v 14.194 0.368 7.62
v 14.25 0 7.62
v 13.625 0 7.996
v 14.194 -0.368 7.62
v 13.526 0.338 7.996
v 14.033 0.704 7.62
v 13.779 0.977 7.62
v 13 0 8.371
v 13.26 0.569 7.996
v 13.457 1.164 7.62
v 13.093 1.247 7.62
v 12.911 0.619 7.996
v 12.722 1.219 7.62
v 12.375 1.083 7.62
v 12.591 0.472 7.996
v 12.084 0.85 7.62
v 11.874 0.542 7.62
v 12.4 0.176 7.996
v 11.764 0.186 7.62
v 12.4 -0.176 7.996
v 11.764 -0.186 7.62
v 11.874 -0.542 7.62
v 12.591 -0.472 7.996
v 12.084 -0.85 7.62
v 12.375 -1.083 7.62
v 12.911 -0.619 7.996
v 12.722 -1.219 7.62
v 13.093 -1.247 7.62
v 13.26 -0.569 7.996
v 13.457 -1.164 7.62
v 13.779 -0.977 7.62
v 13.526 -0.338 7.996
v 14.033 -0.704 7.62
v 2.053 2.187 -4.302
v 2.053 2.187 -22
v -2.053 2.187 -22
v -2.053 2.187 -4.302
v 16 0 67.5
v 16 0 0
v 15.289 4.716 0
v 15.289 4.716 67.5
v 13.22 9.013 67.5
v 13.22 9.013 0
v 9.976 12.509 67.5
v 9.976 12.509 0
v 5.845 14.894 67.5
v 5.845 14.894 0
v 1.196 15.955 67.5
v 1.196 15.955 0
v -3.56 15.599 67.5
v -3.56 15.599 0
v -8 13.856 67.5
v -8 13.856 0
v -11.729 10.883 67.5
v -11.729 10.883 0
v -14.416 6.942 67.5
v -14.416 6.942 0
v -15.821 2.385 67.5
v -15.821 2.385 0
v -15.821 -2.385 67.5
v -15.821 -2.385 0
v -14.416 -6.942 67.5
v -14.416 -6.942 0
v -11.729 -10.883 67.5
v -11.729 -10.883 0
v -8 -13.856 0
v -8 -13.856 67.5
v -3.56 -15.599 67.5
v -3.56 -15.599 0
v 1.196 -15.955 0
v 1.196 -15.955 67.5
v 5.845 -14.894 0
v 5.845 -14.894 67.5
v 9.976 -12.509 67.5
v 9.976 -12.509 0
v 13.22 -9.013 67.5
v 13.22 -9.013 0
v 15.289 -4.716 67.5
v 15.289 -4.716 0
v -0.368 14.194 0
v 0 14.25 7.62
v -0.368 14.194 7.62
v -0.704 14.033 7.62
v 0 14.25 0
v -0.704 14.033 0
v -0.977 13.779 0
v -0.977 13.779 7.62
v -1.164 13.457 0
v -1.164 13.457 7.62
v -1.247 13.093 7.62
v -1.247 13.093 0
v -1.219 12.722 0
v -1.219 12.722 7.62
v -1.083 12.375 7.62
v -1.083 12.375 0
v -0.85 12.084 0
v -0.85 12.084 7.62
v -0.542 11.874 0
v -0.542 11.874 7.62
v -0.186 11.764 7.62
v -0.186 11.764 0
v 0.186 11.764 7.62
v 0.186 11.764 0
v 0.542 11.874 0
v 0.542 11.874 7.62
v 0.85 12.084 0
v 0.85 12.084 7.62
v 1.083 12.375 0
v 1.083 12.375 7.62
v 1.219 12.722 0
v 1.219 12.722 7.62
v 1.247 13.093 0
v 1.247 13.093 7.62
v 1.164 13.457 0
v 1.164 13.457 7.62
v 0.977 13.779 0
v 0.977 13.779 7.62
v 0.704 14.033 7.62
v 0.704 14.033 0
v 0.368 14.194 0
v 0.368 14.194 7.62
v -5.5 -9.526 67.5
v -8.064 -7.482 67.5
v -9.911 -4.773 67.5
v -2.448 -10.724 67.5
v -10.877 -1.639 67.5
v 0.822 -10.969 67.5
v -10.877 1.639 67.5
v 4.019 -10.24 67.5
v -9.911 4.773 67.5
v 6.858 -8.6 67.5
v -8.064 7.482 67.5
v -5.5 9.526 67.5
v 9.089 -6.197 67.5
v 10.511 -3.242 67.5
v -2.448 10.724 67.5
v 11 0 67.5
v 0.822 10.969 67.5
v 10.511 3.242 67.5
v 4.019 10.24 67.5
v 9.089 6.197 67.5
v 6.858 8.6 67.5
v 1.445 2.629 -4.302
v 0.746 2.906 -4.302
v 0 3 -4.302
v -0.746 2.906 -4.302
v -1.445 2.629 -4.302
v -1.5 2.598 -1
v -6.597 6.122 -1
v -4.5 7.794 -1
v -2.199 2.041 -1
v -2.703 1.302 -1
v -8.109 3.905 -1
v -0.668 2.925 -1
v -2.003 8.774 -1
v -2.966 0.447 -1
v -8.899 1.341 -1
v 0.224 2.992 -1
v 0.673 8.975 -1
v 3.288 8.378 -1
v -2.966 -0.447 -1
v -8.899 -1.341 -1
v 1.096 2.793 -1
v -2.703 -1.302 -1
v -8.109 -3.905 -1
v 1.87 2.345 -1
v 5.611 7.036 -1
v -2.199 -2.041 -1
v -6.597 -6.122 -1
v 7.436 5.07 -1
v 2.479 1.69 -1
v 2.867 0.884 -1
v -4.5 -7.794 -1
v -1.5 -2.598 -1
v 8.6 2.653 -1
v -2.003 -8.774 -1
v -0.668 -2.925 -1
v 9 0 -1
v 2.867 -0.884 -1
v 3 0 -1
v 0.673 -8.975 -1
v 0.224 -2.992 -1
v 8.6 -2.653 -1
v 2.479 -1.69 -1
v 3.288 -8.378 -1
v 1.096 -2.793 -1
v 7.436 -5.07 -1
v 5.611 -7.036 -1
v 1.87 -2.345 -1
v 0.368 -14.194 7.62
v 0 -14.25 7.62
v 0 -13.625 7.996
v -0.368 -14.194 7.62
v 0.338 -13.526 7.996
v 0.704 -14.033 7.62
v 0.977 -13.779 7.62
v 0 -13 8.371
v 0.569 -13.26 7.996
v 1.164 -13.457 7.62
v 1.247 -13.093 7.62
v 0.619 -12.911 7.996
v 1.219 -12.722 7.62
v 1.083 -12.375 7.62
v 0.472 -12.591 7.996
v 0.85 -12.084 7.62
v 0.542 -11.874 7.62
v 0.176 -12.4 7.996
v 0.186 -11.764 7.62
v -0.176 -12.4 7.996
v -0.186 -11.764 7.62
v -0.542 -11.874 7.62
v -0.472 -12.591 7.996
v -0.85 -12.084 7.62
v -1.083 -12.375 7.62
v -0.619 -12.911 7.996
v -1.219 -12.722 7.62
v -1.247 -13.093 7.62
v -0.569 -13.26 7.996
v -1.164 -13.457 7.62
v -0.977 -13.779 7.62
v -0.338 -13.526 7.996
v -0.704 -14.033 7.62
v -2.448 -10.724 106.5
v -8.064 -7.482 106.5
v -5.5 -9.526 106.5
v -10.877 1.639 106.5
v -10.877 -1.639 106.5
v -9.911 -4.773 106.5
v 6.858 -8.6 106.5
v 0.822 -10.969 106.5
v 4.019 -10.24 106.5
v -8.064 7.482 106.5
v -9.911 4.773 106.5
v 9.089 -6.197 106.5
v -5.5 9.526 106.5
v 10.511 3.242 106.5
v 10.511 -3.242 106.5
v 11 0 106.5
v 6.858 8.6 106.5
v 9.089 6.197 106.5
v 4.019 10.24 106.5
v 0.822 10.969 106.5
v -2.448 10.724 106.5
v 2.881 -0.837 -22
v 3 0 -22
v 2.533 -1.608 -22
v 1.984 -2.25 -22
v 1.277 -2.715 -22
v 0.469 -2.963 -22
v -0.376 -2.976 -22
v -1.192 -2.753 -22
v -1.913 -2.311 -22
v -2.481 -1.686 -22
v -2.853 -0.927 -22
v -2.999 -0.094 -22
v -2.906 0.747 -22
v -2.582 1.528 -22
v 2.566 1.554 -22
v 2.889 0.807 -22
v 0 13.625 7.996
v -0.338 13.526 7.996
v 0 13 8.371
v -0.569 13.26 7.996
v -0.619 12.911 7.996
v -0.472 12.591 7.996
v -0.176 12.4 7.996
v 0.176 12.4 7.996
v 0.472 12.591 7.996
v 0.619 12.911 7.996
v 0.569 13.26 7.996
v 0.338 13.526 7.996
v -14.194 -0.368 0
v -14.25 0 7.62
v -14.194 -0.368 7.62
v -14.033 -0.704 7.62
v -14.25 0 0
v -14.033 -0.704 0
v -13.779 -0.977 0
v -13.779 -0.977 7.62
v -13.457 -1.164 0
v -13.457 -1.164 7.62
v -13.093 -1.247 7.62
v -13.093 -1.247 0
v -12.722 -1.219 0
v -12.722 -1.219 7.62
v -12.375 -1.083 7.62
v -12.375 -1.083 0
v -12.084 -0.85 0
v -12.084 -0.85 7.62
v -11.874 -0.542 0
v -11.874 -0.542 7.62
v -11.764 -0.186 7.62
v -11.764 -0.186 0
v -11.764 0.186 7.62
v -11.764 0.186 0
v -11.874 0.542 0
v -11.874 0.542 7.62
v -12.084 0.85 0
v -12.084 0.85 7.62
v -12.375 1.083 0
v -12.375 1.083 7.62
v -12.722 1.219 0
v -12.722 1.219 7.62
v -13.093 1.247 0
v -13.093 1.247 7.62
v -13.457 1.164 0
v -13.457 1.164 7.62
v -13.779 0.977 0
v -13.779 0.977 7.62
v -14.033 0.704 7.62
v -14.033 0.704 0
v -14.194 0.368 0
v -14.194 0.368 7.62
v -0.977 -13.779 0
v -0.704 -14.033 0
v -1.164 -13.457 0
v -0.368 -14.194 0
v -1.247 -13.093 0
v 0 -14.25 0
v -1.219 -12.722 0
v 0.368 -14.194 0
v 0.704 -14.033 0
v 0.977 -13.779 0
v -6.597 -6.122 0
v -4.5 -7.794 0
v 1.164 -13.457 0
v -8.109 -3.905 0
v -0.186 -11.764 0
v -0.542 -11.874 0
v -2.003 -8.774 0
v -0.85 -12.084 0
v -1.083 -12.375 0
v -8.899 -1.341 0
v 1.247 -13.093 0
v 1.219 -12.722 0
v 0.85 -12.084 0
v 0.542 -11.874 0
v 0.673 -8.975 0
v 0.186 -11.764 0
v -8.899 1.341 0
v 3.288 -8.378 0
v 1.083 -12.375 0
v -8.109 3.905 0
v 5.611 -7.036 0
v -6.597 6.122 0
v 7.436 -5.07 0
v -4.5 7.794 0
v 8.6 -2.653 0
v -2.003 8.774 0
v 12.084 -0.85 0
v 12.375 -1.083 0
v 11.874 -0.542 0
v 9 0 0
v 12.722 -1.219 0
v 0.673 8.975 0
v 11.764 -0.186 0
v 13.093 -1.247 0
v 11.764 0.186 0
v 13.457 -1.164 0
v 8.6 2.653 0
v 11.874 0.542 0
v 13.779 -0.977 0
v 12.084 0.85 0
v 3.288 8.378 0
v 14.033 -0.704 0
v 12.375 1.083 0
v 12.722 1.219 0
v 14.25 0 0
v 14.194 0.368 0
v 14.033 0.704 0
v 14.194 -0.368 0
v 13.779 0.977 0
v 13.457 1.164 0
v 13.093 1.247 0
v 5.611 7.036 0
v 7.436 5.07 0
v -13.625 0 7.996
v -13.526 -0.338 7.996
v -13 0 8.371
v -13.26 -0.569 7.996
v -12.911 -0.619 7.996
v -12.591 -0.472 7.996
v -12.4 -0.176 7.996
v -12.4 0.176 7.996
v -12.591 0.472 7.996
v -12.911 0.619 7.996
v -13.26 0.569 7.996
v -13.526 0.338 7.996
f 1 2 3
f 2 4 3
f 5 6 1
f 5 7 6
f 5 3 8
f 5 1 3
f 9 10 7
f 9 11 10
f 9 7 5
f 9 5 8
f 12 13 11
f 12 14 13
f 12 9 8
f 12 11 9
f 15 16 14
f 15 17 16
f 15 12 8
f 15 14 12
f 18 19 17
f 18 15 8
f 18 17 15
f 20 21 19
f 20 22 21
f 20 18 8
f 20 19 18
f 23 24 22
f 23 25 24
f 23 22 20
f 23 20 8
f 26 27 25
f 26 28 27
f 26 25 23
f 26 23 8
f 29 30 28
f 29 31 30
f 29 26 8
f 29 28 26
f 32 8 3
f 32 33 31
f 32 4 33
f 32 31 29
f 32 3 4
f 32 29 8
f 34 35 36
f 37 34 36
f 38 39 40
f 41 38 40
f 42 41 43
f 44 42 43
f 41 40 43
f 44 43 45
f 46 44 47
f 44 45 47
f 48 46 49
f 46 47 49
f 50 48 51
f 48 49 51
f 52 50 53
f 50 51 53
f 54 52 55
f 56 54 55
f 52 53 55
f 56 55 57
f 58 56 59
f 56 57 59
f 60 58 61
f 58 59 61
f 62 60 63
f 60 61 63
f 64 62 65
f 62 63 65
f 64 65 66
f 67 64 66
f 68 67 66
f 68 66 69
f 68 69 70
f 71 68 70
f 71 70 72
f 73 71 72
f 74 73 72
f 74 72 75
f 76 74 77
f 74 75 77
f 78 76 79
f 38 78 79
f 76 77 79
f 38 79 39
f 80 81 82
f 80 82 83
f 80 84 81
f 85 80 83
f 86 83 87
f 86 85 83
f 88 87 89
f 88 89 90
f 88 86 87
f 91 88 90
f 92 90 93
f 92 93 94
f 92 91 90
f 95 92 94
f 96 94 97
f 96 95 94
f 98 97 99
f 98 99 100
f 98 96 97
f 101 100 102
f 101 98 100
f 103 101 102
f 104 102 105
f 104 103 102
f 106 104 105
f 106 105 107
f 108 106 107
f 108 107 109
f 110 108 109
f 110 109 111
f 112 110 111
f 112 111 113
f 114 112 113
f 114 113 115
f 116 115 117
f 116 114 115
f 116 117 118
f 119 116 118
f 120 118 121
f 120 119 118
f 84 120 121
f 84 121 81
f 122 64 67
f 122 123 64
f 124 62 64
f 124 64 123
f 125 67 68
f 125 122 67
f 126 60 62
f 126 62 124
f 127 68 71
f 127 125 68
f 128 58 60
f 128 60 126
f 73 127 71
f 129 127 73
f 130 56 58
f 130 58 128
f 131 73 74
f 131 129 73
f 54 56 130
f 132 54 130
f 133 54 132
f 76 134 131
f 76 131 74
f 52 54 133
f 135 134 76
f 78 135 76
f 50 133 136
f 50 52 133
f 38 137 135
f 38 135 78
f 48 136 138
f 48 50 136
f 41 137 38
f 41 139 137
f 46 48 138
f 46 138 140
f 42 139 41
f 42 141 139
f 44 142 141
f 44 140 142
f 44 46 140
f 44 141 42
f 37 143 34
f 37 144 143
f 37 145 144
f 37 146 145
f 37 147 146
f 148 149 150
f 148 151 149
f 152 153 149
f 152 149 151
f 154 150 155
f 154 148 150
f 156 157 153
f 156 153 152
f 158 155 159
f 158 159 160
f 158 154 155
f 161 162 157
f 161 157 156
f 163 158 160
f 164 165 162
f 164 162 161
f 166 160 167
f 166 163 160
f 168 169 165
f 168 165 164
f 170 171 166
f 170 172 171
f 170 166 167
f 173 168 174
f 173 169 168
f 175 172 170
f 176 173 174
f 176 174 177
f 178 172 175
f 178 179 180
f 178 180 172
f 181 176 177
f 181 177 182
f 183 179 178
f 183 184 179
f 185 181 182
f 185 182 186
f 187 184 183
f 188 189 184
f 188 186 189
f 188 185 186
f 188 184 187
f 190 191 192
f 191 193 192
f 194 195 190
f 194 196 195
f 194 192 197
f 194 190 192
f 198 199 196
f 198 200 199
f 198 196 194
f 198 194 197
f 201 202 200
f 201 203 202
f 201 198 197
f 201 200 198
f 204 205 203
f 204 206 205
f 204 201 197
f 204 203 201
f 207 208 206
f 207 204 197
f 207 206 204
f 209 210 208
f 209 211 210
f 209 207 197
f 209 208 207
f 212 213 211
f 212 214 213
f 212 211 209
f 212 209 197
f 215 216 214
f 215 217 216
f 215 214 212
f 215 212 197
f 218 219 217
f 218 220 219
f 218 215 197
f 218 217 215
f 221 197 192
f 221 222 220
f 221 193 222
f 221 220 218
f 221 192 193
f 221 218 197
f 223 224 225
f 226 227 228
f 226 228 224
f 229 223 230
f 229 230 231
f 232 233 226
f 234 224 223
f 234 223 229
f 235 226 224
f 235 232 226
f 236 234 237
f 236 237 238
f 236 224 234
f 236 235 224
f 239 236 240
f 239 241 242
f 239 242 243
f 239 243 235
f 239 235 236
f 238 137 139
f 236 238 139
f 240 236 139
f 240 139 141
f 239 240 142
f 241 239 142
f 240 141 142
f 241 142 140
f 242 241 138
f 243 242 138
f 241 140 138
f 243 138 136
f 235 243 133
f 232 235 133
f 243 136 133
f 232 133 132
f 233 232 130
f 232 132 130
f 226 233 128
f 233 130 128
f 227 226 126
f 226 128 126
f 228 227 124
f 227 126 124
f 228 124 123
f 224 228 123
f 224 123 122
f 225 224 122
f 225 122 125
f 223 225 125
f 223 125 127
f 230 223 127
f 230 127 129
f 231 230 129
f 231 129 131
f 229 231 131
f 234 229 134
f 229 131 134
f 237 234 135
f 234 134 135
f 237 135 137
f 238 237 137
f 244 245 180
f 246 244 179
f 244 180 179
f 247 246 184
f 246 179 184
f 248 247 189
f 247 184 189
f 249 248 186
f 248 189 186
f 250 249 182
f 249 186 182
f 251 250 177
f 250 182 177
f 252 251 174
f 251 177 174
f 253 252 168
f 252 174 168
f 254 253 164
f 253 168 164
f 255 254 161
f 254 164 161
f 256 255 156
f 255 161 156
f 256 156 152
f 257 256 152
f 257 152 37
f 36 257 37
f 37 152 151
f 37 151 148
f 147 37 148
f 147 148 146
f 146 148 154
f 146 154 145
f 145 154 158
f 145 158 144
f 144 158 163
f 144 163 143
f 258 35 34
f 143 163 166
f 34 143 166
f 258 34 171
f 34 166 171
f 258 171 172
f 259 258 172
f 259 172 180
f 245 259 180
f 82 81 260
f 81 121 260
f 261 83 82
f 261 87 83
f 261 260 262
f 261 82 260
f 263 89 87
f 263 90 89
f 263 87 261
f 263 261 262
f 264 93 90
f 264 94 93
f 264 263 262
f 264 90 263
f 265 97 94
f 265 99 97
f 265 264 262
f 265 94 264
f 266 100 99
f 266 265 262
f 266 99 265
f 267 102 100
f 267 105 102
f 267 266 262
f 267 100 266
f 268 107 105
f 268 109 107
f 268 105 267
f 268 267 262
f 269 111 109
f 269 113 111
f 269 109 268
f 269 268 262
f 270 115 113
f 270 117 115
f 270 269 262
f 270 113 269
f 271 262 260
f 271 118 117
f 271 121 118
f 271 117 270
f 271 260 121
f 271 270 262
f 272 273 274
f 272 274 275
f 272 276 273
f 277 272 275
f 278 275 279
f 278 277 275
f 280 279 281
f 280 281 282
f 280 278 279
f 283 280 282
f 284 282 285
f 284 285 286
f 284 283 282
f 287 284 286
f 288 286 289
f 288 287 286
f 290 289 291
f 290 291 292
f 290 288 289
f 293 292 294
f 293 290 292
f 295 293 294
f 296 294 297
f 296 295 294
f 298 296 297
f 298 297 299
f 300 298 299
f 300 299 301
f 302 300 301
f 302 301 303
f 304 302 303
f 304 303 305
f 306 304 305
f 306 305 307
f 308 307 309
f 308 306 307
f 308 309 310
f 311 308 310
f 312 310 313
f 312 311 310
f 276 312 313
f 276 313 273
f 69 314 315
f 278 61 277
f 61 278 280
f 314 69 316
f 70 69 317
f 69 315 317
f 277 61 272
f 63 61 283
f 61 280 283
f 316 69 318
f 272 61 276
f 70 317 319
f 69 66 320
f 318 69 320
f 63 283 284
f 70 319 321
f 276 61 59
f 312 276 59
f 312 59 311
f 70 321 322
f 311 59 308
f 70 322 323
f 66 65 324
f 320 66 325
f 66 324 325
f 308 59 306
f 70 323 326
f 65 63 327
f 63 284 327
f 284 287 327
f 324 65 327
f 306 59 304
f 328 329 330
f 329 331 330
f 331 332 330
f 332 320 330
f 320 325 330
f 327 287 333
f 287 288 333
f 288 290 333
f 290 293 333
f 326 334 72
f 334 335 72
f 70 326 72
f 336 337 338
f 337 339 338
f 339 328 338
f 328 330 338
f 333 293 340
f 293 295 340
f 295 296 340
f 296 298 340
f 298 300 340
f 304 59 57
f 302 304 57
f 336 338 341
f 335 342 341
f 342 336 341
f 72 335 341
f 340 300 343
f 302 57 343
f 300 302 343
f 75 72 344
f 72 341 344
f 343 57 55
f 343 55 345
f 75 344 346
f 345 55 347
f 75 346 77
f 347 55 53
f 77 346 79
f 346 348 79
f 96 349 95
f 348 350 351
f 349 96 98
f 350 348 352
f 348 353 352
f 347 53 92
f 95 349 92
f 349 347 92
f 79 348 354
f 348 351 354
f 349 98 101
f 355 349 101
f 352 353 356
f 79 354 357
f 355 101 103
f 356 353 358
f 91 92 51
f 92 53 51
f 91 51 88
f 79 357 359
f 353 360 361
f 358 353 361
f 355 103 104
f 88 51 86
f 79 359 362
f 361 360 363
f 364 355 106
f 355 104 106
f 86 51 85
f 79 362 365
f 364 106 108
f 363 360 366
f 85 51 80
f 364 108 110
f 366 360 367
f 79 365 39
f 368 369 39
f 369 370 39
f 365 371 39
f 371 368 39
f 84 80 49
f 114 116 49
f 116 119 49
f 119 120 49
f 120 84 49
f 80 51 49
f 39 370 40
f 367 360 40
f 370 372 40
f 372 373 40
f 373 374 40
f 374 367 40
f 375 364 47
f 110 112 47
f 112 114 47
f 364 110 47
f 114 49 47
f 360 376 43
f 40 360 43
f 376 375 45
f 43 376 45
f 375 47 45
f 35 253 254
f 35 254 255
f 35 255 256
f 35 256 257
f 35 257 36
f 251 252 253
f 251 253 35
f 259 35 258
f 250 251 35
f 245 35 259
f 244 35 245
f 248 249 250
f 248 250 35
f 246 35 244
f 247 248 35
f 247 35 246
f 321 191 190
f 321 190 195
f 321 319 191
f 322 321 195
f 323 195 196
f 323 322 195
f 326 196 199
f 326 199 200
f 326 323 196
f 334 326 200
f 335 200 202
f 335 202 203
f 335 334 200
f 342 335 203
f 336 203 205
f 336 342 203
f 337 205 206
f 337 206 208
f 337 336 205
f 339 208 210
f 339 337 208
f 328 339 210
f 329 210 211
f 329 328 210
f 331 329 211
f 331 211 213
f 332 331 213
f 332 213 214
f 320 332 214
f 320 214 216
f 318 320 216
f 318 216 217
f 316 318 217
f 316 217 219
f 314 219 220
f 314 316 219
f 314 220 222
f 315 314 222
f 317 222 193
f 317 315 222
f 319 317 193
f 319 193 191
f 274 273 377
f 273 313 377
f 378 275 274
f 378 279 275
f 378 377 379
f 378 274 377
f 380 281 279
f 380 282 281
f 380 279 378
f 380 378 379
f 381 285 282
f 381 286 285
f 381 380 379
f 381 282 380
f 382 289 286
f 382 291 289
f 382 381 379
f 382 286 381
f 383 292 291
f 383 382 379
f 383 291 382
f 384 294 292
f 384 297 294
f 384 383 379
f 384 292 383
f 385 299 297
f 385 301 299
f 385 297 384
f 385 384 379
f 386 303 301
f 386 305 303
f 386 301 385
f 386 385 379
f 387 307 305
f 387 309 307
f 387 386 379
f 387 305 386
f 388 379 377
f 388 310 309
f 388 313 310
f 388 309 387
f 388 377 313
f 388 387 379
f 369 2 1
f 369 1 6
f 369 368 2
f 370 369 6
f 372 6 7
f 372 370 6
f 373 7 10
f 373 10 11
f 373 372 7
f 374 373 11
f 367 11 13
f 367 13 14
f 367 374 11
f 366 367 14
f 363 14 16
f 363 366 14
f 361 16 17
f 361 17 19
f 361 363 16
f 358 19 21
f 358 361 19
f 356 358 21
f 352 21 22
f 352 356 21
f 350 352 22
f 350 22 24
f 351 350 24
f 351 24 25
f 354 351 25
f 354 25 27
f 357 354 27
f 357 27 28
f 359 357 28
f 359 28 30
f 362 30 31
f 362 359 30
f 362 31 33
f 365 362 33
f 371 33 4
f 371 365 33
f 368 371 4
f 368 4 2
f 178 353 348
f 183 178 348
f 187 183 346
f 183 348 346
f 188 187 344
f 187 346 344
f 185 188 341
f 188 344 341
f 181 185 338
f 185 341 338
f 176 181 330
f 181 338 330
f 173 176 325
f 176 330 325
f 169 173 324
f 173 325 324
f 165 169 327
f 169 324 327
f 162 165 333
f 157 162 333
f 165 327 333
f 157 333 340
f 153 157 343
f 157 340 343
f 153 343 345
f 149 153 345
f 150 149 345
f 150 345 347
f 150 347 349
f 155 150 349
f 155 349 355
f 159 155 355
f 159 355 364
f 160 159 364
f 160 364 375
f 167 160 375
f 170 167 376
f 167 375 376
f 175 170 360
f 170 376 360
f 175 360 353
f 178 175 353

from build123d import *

# Parameters (mm, degrees)
SKETCH1_R           = 16
BOSS_EXTRUDE1_DEPTH = 67.5
SKETCH2_R           = 9
BOSS_EXTRUDE2_DEPTH = 1
SKETCH3_R           = 3
BOSS_EXTRUDE3_DEPTH = 21
CUT_EXTRUDE1_DEPTH  = 17.698
SKETCH5_R           = 11
BOSS_EXTRUDE4_DEPTH = 39
CIRPATTERN1_COUNT   = 4


with BuildPart() as part:
    # Sketch1 → Boss-Extrude1 (new body)
    with BuildSketch(Plane.XY):
        Circle(SKETCH1_R)
    extrude(amount=BOSS_EXTRUDE1_DEPTH)

    # Sketch2 → Boss-Extrude2 (add)
    with BuildSketch(Plane(origin=(0, 0, 0), x_dir=(-1, 0, 0), z_dir=(0, 0, -1))):
        with Locations(Location((0, 0, 0), (0, 0, 180))):
            Circle(SKETCH2_R)
    extrude(amount=BOSS_EXTRUDE2_DEPTH)

    # Sketch3 → Boss-Extrude3 (add)
    with BuildSketch(Plane(origin=(0, 0, -1), x_dir=(-1, 0, 0), z_dir=(0, 0, -1))):
        with Locations(Location((0, 0, 0), (0, 0, 180))):
            Circle(SKETCH3_R)
    extrude(amount=BOSS_EXTRUDE3_DEPTH)

    # Sketch4 → Cut-Extrude1 (cut)
    with BuildSketch(Plane(origin=(0, 0, -22), x_dir=(-1, 0, 0), z_dir=(0, 0, -1))):
        Polygon((-3.161861974, 2.187315475), (3.465054218, 2.187315475), (3.465054218, 5.609056515), align=None)
    extrude(amount=-CUT_EXTRUDE1_DEPTH, mode=Mode.SUBTRACT)

    # Sketch5 → Boss-Extrude4 (add)
    with BuildSketch(Plane.XY.offset(67.5)):
        Circle(SKETCH5_R)
    extrude(amount=BOSS_EXTRUDE4_DEPTH)

    # Sketch8 → M3x0.5 Tapped Hole1 (revolve, cut)
    with BuildSketch(Plane(origin=(0, 13, 0), x_dir=(0, 1, 0), z_dir=(1, 0, 0))):
        Polygon((0, 0), (0, 8.371075774), (1.25, 7.62), (1.25, 0), align=None)
    m3x0_5_tapped_hole1 = revolve(axis=Axis((0, 13, -6.35), (0, 0, 1)), mode=Mode.SUBTRACT)

    # CirPattern1: M3x0.5 Tapped Hole1 ×4 about axis
    cirpattern1_axis = Axis((0, 0, 0), (0, 0, 1))
    for i in range(1, CIRPATTERN1_COUNT):
        add(m3x0_5_tapped_hole1.rotate(cirpattern1_axis, i * 360 / CIRPATTERN1_COUNT), mode=Mode.SUBTRACT)


solid = part.part
